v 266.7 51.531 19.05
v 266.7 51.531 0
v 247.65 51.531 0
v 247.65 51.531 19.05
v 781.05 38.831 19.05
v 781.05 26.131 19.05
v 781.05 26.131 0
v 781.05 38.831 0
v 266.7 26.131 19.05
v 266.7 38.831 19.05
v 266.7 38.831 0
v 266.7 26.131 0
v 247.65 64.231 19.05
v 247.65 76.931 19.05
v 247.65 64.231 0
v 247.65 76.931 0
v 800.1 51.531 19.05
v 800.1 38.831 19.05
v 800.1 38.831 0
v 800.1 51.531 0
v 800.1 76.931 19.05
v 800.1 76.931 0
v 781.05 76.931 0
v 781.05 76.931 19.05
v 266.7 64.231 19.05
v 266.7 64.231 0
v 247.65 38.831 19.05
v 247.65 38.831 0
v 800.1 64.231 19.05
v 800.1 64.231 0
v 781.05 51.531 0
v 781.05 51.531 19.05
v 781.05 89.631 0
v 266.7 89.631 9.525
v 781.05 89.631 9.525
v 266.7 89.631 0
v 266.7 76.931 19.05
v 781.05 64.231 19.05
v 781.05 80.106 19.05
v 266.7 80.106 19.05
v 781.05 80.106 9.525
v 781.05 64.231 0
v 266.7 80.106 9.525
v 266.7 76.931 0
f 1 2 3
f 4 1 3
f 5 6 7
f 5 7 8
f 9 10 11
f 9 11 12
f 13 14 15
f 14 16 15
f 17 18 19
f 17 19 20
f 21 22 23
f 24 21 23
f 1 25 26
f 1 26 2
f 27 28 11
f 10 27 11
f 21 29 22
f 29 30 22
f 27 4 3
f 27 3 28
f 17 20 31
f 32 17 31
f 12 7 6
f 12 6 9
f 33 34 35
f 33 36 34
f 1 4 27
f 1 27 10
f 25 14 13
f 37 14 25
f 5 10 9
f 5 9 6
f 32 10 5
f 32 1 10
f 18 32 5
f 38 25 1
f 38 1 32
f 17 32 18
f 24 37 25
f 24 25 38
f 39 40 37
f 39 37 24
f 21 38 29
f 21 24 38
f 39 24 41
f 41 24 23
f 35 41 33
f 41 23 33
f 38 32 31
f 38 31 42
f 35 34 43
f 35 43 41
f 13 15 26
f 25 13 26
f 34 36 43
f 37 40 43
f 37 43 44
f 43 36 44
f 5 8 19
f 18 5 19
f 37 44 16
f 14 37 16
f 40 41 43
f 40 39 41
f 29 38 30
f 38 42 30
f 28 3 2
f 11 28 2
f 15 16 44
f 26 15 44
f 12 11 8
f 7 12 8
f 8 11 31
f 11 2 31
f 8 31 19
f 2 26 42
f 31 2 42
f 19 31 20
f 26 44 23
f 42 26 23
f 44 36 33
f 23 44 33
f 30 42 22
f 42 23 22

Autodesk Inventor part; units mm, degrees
ref_plane "YZ Plane" through (0, 0, 0) normal (1, 0, 0) x (0, 1, 0)
ref_plane "XZ Plane" through (0, 0, 0) normal (0, 1, 0) x (-1, 0, 0)
ref_plane "XY Plane" through (0, 0, 0) normal (0, 0, 1) x (1, 0, 0)
sketch "Sketch1" plane through (0, 0, 0) normal (0, 0, 1) x (1, 0, 0)
  line L0 (266.7, 89.6306) -> (523.875, 89.6306)
  line L1 (523.875, 89.6306) -> (523.875, 26.1306)
  line L2 (523.875, 26.1306) -> (266.7, 26.1306)
  line L3 (266.7, 89.6306) -> (266.7, 76.9306)
  line L4 (266.7, 76.9306) -> (247.65, 76.9306)
  line L5 (247.65, 76.9306) -> (247.65, 64.2306)
  line L6 (247.65, 64.2306) -> (266.7, 64.2306)
  line L7 (266.7, 64.2306) -> (266.7, 51.5306)
  line L8 (266.7, 51.5306) -> (247.65, 51.5306)
  line L9 (247.65, 51.5306) -> (247.65, 38.8306)
  line L10 (247.65, 38.8306) -> (266.7, 38.8306)
  line L11 (266.7, 38.8306) -> (266.7, 26.1306)
  point P0 (0, 0)
  dimension "d4" = 63.5
  dimension "d17" = 257.175
  dimension "d18" = 19.05
  dimension "d19" = 12.7
  dimension "d20" = 12.7
  dimension "d21" = 12.7
  dimension "d22" = 12.7
  dimension "d23" = 12.7
  dimension "d24" = 0
extrude "Extrusion1" add sketch "Sketch1" along normal blind 19.05
mirror "Mirror1" about plane through (523.875, 26.1306, 0) normal (1, 0, 0) of "Extrusion1"
sketch "Sketch3" plane through (0, 0, 19.05) normal (0, 0, 1) x (1, 0, 0)
  line L0 (266.7, 89.6306) -> (781.05, 89.6306)
  line L1 (781.05, 89.6306) -> (781.05, 80.1056)
  line L2 (781.05, 80.1056) -> (266.7, 80.1056)
  line L3 (266.7, 80.1056) -> (266.7, 89.6306)
  point P0 (0, 0)
  dimension "d25" = 9.525
extrude "Extrusion3" cut sketch "Sketch3" against normal blind 9.525
properties part number "top_cover_side" material "Wood (Birch)"
